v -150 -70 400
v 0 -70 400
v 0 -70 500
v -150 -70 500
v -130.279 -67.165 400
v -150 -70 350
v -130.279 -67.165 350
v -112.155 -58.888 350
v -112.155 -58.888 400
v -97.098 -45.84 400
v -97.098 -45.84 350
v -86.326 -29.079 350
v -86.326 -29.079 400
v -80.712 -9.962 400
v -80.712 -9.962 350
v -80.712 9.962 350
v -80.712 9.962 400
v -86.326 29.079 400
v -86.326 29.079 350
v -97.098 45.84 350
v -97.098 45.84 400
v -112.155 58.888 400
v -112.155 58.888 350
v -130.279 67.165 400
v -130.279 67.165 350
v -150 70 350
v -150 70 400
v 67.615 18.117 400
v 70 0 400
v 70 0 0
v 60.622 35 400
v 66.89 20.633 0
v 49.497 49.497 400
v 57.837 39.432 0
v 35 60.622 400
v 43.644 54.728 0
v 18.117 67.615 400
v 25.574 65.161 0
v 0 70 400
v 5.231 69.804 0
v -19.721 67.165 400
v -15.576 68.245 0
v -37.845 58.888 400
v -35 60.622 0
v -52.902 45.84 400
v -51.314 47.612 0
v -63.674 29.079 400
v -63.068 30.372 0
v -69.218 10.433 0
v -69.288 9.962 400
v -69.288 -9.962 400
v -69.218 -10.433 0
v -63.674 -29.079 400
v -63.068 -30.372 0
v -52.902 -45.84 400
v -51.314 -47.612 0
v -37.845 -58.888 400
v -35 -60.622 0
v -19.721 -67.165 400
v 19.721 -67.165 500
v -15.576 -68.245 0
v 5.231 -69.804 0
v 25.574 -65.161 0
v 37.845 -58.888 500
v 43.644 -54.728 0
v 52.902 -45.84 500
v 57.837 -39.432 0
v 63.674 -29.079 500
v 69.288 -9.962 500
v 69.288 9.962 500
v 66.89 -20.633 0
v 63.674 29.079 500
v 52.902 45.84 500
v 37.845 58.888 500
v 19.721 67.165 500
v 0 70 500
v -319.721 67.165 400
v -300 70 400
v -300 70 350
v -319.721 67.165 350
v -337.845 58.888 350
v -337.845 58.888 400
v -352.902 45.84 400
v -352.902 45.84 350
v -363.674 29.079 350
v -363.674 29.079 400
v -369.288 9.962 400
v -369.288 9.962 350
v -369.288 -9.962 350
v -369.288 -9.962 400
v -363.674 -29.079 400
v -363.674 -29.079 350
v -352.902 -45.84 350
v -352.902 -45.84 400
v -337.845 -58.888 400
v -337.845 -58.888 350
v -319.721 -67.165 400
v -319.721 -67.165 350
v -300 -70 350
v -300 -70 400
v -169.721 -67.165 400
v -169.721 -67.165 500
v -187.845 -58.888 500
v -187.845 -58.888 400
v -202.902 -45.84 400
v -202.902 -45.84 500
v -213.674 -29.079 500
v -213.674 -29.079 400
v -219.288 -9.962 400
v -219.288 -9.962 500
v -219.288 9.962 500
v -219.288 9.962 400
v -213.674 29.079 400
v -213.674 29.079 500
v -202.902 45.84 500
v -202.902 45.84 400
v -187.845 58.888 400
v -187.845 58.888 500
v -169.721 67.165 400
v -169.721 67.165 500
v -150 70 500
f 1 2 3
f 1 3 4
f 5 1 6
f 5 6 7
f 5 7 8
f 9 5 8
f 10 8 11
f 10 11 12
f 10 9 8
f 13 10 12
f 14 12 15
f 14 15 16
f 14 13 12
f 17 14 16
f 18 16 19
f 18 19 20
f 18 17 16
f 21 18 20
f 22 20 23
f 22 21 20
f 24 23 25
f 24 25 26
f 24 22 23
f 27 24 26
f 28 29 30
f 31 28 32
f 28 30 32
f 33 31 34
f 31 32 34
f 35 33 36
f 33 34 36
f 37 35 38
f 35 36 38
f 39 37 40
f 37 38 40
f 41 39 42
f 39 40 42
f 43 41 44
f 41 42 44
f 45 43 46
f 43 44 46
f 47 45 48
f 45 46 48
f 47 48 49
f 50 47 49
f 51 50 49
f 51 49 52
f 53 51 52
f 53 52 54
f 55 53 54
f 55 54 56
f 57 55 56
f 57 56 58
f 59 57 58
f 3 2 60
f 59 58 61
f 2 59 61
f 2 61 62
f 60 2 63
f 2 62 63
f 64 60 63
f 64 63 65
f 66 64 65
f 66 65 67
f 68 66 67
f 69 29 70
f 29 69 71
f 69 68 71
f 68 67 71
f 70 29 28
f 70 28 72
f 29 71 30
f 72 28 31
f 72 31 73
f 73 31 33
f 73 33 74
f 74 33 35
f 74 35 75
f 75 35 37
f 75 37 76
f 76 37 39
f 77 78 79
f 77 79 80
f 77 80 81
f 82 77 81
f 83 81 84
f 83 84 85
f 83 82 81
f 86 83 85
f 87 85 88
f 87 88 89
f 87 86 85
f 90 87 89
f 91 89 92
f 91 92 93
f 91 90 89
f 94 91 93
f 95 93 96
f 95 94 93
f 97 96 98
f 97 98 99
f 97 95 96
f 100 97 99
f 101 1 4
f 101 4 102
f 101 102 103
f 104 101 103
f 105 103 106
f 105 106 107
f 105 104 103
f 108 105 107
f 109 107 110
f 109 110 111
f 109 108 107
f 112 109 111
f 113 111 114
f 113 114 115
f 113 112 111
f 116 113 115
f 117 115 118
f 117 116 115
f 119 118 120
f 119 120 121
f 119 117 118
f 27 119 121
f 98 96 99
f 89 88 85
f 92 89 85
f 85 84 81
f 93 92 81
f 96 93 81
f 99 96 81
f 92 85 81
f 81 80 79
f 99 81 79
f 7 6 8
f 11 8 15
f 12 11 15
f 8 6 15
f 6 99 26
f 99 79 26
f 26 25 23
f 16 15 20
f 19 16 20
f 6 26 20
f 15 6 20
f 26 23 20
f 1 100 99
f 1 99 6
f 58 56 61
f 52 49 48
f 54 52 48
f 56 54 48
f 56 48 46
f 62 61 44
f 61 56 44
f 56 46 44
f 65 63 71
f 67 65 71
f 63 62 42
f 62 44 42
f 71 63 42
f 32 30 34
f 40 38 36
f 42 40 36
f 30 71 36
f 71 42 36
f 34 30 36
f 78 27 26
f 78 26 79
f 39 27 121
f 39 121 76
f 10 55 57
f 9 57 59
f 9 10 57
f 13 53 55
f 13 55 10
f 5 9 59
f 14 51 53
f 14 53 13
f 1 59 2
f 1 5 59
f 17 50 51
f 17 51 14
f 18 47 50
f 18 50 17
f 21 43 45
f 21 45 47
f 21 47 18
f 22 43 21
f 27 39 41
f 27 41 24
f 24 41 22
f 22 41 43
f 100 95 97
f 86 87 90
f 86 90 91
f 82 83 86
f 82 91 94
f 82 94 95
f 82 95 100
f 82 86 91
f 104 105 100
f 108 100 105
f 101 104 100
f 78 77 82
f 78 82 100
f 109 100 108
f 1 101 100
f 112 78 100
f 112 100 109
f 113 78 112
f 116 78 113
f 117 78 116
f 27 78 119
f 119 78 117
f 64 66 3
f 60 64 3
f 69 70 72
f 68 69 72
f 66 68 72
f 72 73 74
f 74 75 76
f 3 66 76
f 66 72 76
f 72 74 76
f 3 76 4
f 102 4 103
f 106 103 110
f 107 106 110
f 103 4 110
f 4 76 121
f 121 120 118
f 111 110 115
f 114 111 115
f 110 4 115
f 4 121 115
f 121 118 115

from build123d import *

# Parameters (mm, degrees)
SZKIC1_R                    = 70
DODANIE_WYCI_GNI_CIE1_DEPTH = 400
DODANIE_WYCI_GNI_CIE2_DEPTH = 100
DODANIE_WYCI_GNI_CIE3_START = 50
DODANIE_WYCI_GNI_CIE3_DEPTH = 50


with BuildPart() as part:
    # Szkic1 → Dodanie-wyciągnięcie1 (new body)
    with BuildSketch(Plane.XY):
        Circle(SZKIC1_R)
    extrude(amount=DODANIE_WYCI_GNI_CIE1_DEPTH)

    # Szkic2 → Dodanie-wyciągnięcie2 (add)
    with BuildSketch(Plane.XY.offset(400)):
        with BuildLine():
            Line((0, -70), (-150, -70))
            ThreePointArc((-150, -70), (-220, 0), (-150, 70))
            Line((-150, 70), (0, 70))
            ThreePointArc((0, 70), (70, 0), (0, -70))
        make_face()
    extrude(amount=DODANIE_WYCI_GNI_CIE2_DEPTH)

    # Szkic3 → Dodanie-wyciągnięcie3 (add)
    with BuildSketch(Plane(origin=(0, 0, 400), x_dir=(-1, 0, 0), z_dir=(0, 0, -1)).offset(DODANIE_WYCI_GNI_CIE3_START)):
        with BuildLine():
            Line((150, 70), (300, 70))
            ThreePointArc((300, 70), (370, 0), (300, -70))
            Line((300, -70), (150, -70))
            ThreePointArc((150, -70), (80, 0), (150, 70))
        make_face()
    extrude(amount=-DODANIE_WYCI_GNI_CIE3_DEPTH)


solid = part.part
